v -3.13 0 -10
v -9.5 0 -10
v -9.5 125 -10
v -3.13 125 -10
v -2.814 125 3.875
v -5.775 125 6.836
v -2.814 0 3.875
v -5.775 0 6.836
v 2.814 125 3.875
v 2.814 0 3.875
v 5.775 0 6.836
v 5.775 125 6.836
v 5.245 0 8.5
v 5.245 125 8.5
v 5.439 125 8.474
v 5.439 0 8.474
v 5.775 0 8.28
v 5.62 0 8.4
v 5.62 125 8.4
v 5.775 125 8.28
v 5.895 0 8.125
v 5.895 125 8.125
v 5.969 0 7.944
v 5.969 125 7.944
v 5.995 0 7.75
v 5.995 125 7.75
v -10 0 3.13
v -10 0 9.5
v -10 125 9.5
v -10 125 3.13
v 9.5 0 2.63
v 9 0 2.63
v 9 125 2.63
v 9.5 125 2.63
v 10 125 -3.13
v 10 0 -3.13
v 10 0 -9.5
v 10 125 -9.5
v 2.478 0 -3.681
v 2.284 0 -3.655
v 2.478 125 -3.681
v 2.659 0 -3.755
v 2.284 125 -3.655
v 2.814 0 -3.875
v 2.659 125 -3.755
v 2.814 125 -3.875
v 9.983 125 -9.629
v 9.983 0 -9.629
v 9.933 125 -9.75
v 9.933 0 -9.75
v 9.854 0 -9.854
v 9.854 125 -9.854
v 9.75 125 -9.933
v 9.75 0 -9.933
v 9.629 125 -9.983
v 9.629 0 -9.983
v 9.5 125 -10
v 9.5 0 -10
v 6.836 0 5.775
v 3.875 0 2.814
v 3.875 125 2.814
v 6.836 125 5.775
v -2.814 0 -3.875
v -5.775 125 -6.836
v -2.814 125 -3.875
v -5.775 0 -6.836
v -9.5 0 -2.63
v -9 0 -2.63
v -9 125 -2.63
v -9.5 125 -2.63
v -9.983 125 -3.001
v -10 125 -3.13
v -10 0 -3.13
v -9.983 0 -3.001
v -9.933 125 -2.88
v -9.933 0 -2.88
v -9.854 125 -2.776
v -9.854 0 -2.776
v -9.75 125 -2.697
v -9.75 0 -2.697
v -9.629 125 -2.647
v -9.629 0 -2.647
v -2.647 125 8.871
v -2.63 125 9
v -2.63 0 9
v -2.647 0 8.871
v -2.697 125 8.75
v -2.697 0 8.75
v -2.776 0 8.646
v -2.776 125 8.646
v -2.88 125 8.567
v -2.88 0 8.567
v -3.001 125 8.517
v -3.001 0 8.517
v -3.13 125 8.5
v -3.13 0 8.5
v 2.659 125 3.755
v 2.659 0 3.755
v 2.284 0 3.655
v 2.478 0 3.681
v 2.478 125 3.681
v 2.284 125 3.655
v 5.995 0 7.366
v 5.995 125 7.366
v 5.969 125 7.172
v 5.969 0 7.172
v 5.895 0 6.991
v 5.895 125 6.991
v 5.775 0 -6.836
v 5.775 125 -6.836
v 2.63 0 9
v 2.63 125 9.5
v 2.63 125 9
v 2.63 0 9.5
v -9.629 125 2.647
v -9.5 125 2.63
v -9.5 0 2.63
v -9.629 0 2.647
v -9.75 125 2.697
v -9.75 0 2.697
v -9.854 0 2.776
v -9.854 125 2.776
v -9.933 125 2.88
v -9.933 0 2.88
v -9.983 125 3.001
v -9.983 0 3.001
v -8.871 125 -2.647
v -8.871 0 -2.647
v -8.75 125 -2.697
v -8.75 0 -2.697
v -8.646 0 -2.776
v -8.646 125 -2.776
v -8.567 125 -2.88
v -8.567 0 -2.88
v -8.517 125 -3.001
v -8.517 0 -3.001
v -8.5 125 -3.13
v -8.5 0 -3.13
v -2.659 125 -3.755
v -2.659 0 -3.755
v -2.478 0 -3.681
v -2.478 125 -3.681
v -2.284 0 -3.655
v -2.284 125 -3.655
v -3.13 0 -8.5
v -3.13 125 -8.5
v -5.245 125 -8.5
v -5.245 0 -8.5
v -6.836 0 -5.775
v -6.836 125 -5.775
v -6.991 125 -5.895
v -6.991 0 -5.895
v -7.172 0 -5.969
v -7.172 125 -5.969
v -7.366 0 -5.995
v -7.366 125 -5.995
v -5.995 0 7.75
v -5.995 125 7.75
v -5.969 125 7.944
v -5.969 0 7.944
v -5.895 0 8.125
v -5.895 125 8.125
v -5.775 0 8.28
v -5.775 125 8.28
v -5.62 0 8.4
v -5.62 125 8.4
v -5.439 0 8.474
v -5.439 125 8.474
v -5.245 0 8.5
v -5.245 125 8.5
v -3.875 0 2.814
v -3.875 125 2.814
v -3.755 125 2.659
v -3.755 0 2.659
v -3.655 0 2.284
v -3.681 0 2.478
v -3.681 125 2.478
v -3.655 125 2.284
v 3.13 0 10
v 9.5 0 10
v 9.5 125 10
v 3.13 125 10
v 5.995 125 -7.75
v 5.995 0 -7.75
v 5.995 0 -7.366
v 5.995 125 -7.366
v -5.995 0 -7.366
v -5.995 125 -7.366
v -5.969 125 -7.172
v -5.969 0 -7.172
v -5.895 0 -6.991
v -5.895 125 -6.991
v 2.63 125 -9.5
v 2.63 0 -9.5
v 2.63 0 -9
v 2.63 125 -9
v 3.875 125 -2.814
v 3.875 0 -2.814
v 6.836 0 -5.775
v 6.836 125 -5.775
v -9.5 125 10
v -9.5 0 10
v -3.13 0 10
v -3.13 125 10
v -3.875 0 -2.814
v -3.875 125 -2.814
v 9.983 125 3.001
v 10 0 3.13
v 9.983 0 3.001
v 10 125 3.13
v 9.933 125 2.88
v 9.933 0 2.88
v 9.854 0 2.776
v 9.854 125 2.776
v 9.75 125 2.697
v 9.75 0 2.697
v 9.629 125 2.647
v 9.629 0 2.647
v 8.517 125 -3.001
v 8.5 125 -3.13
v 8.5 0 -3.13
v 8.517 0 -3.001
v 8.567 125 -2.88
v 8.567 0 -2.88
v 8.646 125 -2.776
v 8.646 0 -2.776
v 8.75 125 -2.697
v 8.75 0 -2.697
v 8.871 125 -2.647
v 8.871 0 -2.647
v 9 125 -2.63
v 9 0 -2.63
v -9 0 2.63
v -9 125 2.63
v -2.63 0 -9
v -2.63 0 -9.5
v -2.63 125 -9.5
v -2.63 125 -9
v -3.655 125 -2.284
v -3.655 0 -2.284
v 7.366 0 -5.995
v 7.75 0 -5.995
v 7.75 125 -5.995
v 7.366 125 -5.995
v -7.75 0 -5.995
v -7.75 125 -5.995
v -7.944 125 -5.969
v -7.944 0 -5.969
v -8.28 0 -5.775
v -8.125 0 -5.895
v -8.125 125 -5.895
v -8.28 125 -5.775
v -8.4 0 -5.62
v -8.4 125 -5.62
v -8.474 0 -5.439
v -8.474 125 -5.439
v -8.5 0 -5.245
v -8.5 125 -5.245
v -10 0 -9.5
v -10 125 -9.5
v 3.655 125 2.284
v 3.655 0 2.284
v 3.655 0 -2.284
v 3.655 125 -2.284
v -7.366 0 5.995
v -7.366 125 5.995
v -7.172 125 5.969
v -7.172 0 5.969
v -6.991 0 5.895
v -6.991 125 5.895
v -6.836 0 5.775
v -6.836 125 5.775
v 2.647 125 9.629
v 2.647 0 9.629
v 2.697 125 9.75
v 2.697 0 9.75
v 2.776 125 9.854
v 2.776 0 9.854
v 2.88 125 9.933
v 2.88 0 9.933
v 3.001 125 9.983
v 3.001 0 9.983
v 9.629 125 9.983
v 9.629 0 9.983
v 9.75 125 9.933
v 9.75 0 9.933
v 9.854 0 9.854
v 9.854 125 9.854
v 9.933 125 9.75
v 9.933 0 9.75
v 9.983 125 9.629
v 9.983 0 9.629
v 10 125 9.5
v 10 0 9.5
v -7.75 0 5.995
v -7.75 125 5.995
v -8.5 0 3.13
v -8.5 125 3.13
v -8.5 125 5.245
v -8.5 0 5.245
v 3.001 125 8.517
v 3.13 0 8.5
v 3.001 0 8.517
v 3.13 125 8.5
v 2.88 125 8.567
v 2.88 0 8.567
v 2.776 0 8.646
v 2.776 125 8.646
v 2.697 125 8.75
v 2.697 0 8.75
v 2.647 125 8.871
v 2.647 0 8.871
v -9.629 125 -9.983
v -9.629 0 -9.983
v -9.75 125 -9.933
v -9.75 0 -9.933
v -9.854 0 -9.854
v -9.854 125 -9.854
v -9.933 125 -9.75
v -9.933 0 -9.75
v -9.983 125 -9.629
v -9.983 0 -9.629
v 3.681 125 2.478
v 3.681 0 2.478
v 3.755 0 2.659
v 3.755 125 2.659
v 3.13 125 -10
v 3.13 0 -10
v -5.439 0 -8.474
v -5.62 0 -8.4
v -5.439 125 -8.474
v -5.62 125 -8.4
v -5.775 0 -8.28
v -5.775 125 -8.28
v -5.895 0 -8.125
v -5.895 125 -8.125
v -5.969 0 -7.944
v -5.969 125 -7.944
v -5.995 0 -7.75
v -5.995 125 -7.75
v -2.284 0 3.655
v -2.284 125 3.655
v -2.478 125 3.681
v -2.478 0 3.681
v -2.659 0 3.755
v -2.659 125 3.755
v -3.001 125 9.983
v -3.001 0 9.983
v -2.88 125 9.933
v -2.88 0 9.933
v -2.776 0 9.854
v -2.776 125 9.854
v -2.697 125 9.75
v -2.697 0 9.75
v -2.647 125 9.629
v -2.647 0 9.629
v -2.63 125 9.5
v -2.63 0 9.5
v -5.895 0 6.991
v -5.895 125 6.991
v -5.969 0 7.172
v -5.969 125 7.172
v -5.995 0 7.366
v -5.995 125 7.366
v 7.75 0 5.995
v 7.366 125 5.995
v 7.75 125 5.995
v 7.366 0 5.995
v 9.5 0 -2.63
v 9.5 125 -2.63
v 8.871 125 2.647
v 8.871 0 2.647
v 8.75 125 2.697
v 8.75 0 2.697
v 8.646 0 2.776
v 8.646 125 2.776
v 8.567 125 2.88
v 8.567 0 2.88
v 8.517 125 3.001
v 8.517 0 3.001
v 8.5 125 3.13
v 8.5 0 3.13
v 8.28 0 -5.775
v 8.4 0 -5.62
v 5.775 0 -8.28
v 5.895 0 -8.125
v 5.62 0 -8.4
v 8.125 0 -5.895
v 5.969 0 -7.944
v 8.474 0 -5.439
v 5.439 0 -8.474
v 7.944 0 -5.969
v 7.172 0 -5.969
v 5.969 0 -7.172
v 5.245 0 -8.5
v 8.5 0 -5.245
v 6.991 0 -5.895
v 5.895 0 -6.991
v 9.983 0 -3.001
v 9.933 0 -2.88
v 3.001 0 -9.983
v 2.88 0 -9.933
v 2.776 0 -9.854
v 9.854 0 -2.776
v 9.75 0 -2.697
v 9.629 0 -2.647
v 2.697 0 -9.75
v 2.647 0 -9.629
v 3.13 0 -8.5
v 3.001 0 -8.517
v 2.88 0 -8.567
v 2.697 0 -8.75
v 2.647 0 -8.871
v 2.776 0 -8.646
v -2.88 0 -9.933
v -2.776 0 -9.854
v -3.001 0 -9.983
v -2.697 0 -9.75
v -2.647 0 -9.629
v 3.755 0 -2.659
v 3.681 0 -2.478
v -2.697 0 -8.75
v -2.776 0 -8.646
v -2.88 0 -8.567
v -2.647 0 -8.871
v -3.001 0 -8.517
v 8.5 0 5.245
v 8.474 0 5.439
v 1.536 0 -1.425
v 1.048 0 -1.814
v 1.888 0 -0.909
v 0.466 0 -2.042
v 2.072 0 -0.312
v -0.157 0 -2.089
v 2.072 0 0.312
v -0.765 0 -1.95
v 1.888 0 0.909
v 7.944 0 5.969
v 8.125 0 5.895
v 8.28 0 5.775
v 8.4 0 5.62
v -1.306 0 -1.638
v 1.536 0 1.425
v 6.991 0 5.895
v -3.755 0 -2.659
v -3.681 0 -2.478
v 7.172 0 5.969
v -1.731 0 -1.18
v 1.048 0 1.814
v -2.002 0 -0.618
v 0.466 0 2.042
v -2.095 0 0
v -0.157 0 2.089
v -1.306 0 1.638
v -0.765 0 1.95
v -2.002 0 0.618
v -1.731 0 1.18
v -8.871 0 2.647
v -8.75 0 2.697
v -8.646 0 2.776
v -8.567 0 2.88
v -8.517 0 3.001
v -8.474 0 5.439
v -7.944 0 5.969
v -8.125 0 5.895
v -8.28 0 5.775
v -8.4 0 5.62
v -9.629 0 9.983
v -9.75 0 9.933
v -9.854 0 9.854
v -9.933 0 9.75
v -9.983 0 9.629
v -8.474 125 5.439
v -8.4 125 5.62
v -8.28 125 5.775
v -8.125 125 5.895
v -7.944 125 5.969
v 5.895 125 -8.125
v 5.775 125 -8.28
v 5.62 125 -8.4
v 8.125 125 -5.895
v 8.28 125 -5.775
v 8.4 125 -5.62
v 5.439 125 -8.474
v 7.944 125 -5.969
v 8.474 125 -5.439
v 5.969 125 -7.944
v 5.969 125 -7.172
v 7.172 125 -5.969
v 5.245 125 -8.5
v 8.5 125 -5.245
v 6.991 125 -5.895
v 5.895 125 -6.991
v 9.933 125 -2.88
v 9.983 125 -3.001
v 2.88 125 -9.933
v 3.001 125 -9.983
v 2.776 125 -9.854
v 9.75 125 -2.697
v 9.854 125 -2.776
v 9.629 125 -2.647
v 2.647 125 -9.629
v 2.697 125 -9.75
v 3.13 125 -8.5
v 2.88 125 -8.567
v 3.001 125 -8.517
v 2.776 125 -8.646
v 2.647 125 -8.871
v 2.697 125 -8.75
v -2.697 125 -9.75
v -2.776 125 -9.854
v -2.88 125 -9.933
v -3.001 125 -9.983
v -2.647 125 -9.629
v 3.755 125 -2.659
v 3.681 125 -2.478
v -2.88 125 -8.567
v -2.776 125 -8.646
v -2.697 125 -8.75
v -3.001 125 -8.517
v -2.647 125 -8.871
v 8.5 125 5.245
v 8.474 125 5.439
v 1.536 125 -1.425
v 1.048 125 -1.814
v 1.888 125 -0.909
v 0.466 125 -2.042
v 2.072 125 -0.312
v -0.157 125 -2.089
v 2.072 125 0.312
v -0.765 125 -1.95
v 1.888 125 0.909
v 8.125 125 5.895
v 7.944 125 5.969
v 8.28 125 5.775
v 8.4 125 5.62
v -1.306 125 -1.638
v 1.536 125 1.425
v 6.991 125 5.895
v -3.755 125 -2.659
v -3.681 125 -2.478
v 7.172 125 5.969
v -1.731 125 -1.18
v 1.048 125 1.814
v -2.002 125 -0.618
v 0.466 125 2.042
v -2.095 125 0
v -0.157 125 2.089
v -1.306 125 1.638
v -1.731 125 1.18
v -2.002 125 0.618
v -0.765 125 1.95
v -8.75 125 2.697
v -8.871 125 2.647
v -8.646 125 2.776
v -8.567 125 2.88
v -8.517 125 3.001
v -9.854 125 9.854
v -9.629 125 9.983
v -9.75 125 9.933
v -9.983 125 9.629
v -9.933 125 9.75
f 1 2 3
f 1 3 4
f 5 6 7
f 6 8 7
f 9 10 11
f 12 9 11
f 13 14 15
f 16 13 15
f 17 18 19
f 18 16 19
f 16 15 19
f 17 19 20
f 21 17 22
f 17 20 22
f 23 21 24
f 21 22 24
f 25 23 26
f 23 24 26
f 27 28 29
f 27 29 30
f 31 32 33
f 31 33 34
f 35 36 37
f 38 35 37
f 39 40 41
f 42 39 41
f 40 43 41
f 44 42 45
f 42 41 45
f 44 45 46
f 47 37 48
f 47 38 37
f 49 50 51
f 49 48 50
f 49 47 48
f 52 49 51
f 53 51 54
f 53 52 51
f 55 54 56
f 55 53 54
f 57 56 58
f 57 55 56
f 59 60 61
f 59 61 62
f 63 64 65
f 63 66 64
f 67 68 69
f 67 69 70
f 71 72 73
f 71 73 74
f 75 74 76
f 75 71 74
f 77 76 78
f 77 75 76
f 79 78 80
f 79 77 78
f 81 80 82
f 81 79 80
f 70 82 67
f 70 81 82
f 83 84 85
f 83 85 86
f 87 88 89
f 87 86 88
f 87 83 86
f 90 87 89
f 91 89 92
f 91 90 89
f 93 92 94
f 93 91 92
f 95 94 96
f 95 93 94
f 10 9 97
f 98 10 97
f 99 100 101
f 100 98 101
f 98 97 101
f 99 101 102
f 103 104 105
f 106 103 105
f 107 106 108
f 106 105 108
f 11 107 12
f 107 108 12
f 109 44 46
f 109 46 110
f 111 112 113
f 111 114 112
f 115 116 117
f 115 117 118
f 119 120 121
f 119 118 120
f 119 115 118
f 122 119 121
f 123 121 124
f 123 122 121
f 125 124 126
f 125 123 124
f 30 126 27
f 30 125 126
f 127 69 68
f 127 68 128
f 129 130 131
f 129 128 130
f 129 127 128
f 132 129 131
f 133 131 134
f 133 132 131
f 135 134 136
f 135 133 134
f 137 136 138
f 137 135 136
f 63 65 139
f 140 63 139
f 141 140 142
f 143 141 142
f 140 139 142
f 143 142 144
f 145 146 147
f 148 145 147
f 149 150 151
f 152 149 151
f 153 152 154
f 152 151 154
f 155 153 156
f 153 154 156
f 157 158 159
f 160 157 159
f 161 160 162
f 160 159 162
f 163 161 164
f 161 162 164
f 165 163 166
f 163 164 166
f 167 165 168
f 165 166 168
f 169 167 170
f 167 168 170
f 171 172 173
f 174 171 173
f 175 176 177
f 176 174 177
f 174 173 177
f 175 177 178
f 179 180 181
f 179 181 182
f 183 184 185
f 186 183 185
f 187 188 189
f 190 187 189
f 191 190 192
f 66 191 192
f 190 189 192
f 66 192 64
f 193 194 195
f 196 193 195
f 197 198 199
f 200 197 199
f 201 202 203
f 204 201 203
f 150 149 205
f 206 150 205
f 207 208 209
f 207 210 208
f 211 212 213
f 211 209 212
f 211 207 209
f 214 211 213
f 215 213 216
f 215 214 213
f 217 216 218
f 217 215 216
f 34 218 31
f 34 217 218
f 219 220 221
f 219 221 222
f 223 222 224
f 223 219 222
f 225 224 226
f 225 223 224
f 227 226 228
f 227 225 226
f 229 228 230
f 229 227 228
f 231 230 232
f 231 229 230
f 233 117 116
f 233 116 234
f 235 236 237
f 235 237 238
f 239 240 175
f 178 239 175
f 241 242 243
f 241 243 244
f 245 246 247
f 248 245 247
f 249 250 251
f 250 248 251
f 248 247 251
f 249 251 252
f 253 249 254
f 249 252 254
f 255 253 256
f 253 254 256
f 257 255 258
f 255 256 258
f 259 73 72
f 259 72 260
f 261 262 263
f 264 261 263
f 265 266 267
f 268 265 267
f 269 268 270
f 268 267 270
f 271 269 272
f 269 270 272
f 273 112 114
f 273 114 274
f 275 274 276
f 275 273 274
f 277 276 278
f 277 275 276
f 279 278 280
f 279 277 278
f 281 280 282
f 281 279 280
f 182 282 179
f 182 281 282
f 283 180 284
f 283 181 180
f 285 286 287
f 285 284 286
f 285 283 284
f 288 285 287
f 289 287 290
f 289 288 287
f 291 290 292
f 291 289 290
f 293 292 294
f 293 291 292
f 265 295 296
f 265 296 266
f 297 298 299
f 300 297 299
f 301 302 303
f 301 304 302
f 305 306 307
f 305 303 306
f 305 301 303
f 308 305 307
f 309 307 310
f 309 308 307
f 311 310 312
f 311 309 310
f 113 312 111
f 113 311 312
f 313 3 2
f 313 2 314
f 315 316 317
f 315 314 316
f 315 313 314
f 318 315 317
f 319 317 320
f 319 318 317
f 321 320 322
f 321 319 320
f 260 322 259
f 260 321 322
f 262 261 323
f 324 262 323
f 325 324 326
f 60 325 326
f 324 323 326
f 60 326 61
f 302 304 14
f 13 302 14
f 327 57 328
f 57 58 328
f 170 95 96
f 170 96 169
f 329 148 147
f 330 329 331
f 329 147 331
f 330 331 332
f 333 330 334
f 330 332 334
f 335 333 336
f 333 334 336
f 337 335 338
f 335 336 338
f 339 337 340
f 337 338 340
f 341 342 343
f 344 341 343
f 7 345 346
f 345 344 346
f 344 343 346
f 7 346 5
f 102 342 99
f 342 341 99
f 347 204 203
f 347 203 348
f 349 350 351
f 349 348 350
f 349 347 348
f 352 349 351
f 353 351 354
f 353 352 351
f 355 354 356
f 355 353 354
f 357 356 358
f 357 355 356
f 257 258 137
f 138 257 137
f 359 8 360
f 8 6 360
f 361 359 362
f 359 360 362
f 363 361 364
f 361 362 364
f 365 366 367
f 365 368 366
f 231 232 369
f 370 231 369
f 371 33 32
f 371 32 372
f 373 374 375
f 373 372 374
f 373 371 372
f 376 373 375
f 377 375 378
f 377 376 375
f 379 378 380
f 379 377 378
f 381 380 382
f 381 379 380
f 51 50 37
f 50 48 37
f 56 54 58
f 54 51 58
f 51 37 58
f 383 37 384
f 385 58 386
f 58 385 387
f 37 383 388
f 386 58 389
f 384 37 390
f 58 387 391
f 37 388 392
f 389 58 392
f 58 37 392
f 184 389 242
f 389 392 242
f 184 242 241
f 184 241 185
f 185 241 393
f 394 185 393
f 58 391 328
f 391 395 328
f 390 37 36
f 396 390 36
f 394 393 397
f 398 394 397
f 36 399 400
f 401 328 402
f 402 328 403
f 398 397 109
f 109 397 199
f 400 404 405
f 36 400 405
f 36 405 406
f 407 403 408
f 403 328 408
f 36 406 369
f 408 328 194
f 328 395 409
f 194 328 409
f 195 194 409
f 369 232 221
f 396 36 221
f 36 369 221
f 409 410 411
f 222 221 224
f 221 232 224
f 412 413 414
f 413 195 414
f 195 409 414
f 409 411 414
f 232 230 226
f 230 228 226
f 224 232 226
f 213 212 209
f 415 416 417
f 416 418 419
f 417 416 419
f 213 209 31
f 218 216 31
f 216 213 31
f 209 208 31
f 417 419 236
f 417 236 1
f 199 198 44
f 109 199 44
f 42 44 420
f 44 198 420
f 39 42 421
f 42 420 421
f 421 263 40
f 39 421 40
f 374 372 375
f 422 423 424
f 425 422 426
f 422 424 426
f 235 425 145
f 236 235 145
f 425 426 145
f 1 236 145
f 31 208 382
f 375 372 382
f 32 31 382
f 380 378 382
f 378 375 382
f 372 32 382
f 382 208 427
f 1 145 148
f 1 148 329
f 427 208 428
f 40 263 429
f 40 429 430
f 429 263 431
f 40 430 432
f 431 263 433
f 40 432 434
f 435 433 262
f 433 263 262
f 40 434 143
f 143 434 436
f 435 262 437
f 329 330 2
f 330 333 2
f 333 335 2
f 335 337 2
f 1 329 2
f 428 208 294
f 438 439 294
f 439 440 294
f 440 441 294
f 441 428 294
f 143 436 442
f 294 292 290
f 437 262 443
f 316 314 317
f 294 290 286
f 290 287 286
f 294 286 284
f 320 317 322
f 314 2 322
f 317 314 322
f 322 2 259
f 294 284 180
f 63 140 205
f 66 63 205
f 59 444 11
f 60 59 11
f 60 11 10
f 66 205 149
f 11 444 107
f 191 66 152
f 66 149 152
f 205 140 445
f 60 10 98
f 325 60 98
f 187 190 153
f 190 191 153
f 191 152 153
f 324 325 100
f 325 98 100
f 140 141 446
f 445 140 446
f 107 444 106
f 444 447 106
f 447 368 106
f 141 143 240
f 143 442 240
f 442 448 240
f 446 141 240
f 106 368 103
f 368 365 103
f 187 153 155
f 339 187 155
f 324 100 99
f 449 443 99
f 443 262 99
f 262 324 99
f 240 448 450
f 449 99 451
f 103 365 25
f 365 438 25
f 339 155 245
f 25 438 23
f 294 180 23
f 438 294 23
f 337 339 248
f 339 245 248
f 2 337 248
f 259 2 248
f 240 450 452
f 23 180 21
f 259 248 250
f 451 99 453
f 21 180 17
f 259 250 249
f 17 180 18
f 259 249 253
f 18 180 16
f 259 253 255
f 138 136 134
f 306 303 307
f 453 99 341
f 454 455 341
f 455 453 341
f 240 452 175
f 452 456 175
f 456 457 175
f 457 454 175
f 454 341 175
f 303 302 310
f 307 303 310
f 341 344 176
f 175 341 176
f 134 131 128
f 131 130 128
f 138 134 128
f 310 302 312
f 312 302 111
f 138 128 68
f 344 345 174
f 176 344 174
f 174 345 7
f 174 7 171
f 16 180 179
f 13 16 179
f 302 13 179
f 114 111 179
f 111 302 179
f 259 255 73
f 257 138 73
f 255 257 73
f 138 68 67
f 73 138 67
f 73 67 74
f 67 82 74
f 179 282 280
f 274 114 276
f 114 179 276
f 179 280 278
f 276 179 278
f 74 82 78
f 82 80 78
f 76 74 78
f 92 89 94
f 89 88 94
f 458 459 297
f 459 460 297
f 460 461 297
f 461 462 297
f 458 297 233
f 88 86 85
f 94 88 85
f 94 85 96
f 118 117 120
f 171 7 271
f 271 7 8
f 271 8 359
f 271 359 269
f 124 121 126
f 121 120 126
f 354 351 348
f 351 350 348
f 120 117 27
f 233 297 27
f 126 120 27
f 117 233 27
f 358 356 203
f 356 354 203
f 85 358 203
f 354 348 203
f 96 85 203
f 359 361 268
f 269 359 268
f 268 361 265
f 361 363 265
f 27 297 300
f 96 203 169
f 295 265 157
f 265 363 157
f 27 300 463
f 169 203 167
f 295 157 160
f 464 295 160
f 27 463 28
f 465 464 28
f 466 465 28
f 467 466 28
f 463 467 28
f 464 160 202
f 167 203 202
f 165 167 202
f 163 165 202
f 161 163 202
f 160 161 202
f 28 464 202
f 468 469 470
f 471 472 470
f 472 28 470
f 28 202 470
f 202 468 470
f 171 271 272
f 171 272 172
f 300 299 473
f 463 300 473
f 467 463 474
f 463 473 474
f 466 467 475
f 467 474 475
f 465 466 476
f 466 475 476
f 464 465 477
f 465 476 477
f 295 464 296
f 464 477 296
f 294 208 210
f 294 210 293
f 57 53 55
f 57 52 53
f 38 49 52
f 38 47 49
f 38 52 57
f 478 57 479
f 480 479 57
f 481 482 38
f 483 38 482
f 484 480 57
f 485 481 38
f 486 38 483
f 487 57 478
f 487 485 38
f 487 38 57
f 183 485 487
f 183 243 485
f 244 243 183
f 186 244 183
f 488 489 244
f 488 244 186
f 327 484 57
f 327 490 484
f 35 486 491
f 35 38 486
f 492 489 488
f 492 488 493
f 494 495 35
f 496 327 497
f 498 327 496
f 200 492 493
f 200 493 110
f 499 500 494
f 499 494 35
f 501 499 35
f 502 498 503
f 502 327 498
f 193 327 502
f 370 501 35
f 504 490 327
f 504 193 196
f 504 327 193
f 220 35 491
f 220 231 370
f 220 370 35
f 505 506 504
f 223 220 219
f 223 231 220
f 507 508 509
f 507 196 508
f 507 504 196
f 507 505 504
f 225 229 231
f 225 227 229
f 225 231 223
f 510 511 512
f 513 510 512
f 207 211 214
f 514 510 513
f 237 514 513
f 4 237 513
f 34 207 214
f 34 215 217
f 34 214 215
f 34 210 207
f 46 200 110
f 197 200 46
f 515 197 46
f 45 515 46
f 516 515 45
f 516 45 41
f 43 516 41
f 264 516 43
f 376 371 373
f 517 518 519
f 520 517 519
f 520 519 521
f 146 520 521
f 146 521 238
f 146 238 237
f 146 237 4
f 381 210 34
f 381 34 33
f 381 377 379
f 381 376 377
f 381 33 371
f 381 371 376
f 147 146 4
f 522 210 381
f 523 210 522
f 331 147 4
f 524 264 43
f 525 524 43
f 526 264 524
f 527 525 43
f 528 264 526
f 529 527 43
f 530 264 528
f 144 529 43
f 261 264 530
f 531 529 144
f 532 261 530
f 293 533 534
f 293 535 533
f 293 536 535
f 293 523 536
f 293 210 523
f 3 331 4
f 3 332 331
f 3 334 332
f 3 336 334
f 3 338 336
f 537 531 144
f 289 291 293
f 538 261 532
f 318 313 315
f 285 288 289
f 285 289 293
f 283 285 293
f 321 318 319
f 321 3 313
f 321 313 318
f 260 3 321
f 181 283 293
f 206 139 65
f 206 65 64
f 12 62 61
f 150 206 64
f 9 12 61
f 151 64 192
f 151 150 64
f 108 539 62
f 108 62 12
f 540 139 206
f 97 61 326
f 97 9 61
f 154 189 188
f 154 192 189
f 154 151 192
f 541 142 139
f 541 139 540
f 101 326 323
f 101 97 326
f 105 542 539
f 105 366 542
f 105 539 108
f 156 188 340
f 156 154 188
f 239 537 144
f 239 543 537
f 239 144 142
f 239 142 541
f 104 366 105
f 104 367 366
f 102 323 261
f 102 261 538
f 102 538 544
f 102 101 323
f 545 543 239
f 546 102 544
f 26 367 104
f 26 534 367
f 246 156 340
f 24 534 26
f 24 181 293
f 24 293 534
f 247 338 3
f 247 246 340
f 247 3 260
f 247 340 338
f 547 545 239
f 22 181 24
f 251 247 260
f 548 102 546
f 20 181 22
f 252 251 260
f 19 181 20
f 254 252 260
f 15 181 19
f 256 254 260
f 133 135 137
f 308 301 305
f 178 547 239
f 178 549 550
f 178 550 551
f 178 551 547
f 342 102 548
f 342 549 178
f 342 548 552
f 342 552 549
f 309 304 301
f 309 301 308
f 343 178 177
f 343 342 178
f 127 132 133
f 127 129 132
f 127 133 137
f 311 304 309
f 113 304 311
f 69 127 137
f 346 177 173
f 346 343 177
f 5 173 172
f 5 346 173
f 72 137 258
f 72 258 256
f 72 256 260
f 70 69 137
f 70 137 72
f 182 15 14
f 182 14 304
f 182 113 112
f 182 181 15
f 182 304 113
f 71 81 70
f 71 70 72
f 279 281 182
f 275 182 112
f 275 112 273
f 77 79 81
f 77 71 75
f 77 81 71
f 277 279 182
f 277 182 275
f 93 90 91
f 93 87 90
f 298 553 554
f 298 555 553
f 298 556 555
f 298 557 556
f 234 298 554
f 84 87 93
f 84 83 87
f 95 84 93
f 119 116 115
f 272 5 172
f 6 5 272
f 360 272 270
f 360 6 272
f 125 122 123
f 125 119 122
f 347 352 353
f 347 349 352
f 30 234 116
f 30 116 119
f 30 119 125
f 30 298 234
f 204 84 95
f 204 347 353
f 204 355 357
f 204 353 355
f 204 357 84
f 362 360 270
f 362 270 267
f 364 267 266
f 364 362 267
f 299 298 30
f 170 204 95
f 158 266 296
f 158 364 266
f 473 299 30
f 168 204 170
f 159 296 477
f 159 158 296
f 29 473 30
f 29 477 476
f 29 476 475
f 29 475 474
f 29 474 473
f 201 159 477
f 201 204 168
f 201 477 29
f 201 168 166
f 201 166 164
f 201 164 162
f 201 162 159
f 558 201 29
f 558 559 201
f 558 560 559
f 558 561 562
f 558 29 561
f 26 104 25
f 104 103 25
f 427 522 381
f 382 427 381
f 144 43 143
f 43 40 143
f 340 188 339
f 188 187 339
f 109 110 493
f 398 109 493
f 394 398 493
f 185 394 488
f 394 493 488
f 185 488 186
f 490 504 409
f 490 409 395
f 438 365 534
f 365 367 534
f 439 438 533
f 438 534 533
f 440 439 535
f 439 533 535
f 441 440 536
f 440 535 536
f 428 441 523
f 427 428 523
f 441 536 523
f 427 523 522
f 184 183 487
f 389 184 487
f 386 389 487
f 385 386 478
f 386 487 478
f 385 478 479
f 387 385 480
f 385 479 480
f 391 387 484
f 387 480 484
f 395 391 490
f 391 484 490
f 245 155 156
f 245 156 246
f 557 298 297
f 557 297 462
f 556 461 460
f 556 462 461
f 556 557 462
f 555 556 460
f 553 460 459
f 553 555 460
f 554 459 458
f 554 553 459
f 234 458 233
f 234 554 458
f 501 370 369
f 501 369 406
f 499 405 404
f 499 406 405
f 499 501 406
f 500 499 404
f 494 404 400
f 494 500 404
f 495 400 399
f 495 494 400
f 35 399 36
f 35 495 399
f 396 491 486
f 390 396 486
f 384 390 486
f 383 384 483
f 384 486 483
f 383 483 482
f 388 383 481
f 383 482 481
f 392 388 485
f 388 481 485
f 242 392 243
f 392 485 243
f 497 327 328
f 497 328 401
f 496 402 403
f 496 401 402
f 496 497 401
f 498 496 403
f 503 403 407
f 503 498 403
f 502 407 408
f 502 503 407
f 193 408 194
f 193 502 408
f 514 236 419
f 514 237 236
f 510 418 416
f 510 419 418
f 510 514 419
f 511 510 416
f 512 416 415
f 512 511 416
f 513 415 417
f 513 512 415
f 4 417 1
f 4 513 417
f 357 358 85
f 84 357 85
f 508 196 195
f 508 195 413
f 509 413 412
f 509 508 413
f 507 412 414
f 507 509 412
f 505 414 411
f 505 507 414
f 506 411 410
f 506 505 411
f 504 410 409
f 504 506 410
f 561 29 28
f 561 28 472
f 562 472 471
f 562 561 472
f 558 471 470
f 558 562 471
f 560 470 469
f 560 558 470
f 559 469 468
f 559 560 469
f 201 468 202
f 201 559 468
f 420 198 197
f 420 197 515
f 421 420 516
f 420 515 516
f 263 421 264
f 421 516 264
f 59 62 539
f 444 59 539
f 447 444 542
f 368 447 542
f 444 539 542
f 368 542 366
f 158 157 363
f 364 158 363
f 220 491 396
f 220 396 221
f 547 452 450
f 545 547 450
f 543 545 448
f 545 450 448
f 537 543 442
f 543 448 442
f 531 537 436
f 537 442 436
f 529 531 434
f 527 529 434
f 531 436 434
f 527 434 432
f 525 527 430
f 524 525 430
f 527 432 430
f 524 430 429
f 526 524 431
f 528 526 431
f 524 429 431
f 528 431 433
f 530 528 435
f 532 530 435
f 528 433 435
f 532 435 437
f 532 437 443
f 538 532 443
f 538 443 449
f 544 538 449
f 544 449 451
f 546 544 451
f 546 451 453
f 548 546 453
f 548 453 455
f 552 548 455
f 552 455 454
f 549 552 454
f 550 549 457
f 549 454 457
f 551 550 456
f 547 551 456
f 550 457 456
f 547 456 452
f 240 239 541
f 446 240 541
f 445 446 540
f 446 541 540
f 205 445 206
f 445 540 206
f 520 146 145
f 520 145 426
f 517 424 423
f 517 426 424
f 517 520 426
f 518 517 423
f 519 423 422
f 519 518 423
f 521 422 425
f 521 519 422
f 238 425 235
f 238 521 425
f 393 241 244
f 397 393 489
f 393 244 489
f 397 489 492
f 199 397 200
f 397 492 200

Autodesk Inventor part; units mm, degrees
ref_plane "YZ Plane" through (0, 0, 0) normal (1, 0, 0) x (0, 1, 0)
ref_plane "XZ Plane" through (0, 0, 0) normal (0, 1, 0) x (-1, 0, 0)
ref_plane "XY Plane" through (0, 0, 0) normal (0, 0, 1) x (1, 0, 0)
sketch "Sketch1" plane through (0, 0, 0) normal (0, 1, 0) x (-1, 0, 0)
  line L0 (0, -14) -> (0, 14) projected
  line L1 (-14, 0) -> (14, 0) projected
  line L2 (14, 0) -> (-14, 0) projected
  line L3 (0, -14) -> (0, 14) projected
  line L4 (2.5943, 3.655) -> (-2.5943, 3.655)
  line L5 (-3.655, 2.5943) -> (-3.655, -2.5943)
  line L6 (-2.5943, -3.655) -> (2.5943, -3.655)
  line L7 (3.655, -2.5943) -> (3.655, 2.5943)
  line L8 (-3.655, 3.655) -> (3.655, -3.655) construction
  line L9 (10, 10) -> (10, 2.63)
  line L10 (10, 2.63) -> (8.5, 2.63)
  line L11 (10, 10) -> (2.63, 10)
  line L12 (2.63, 10) -> (2.63, 8.5)
  line L13 (-10, 10) -> (-2.63, 10)
  line L14 (-2.63, 10) -> (-2.63, 8.5)
  line L15 (-10, 8.5) -> (-10, 10)
  line L16 (-10, 10) -> (-8.5, 10)
  line L17 (-8.5, 2.63) -> (-10, 2.63)
  line L18 (-10, 2.63) -> (-10, 10)
  line L19 (-10, -10) -> (-8.5, -10)
  line L20 (-8.5, -2.63) -> (-10, -2.63)
  line L21 (-10, -2.63) -> (-10, -10)
  line L22 (-10, -10) -> (-2.63, -10)
  line L23 (-2.63, -10) -> (-2.63, -8.5)
  line L24 (-10, -8.5) -> (-10, -10)
  line L25 (10, -10) -> (8.5, -10)
  line L26 (8.5, -2.63) -> (10, -2.63)
  line L27 (10, -2.63) -> (10, -10)
  line L28 (10, -10) -> (2.63, -10)
  line L29 (2.63, -10) -> (2.63, -8.5)
  line L30 (10, -8.5) -> (10, -10)
  circle A0 centre (0, 0) radius 2.095
  line L31 (5.995, -10) -> (2.63, -10)
  line L32 (-2.63, -10) -> (-5.995, -10)
  line L33 (10, -10) -> (2.63, -10)
  line L34 (-2.63, -10) -> (-10, -10)
  line L35 (10, -5.995) -> (10, -2.63)
  line L36 (10, 2.63) -> (10, 5.995)
  line L37 (10, 10) -> (10, 2.63)
  line L38 (10, -2.63) -> (10, -10)
  line L39 (-5.995, 10) -> (-2.63, 10)
  line L40 (2.63, 10) -> (5.995, 10)
  line L41 (-10, 10) -> (-2.63, 10)
  line L42 (2.63, 10) -> (10, 10)
  line L43 (-10, 5.995) -> (-10, 2.63)
  line L44 (-10, -2.63) -> (-10, -5.995)
  line L45 (-10, -10) -> (-10, -2.63)
  line L46 (-10, 2.63) -> (-10, 10)
  line L47 (-2.63, -8.5) -> (-5.995, -8.5)
  line L48 (-8.5, -5.995) -> (-8.5, -2.63)
  line L49 (-8.5, -5.995) -> (-7.0557, -5.995)
  line L50 (-5.995, -8.5) -> (-5.995, -7.0557)
  line L51 (-5.995, 7.0557) -> (-5.995, 8.5)
  line L52 (2.63, 8.5) -> (5.995, 8.5)
  line L53 (8.5, 2.63) -> (8.5, 5.995)
  line L54 (8.5, 5.995) -> (7.0557, 5.995)
  line L55 (5.995, 8.5) -> (5.995, 7.0557)
  line L56 (2.63, -8.5) -> (5.995, -8.5)
  line L57 (9.5607, -8.5) -> (10, -8.5)
  line L58 (8.5, -10) -> (8.5, -9.5607)
  line L59 (8.5, -5.995) -> (8.5, -2.63)
  line L60 (7.0557, -5.995) -> (8.5, -5.995)
  line L61 (5.995, -7.0557) -> (5.995, -8.5)
  line L62 (3.655, 3.655) -> (-0.5303, -0.5303) construction
  line L63 (-1.4814, -1.4814) -> (-3.655, -3.655) construction
  line L64 (-8.5, 10) -> (-8.5, 9.5607)
  line L65 (-8.5, 5.995) -> (-8.5, 2.63)
  line L66 (-2.63, 8.5) -> (-5.995, 8.5)
  line L67 (-9.5607, 8.5) -> (-10, 8.5)
  line L68 (-7.0557, 5.995) -> (-8.5, 5.995)
  line L69 (-3.655, 2.5943) -> (-7.0557, 5.995)
  line L70 (-2.5943, 3.655) -> (-5.995, 7.0557)
  line L71 (5.995, 7.0557) -> (2.5943, 3.655)
  line L72 (7.0557, 5.995) -> (3.655, 2.5943)
  line L73 (7.0557, -5.995) -> (3.655, -2.5943)
  line L74 (5.995, -7.0557) -> (2.5943, -3.655)
  line L75 (-2.5943, -3.655) -> (-5.995, -7.0557)
  line L76 (-3.655, -2.5943) -> (-7.0557, -5.995)
  dimension "d26" = 4.19
  dimension "d0" = 20
  dimension "d1" = 20
  dimension "d2" = 7.31
  dimension "d3" = 7.31
  dimension "d4" = 20
  dimension "d5" = 11.99
  dimension "d6" = 11.99
  dimension "d11" = 7.37
  dimension "d12" = 1.5
  dimension "d13" = 7.37
  dimension "d14" = 1.5
  dimension "d15" = 7.37
  dimension "d16" = 1.5
  dimension "d17" = 7.37
  dimension "d18" = 1.5
  dimension "d19" = 7.37
  dimension "d20" = 7.37
  dimension "d21" = 1.5
  dimension "d22" = 1.5
  dimension "d23" = 7.37
  dimension "d24" = 7.37
  dimension "d25" = 1.5
extrude "Extrusion1" add sketch "Sketch1" along normal blind 125 contours L6 L75 L50 L47 L23 L22 L19 L21 L20 L48 L49 L76 L5 L1 A0 L0 | L0 A0 L1 L7 L73 L60 L59 L26 L27 L25 L28 L29 L56 L61 L74 L6 | L1 L5 L69 L68 L65 L17 L18 L15 L13 L14 L66 L51 L70 L4 L0 A0 | A0 L0 L4 L71 L55 L52 L12 L11 L9 L10 L53 L54 L72 L7 L1
fillet "Fillet1" radius 0.5 20 edges at (10, 62.5, 10) (2.63, 62.5, 10) (-2.63, 62.5, 10) (-2.63, 62.5, 8.5) (10, 62.5, 2.63) (8.5, 62.5, 2.63) (10, 62.5, -2.63) (8.5, 62.5, -2.63) (10, 62.5, -10) (2.63, 62.5, -8.5) (-2.63, 62.5, -10) (-2.63, 62.5, -8.5) (2.63, 62.5, -10) (-10, 62.5, -10) (-8.5, 62.5, -2.63) (-10, 62.5, -2.63) (-8.5, 62.5, 2.63) (-10, 62.5, 2.63) (-10, 62.5, 10) (2.63, 62.5, 8.5)
fillet "Fillet2" radius 0.75 24 edges at (-7.0557, 62.5, 5.995) (-3.655, 62.5, 2.5943) (-8.5, 62.5, -5.995) (-7.0557, 62.5, -5.995) (-5.995, 62.5, -8.5) (3.655, 62.5, -2.5943) (7.0557, 62.5, -5.995) (-2.5943, 62.5, 3.655) (-5.995, 62.5, 7.0557) (3.655, 62.5, 2.5943) (7.0557, 62.5, 5.995) (8.5, 62.5, 5.995) (8.5, 62.5, -5.995) (2.5943, 62.5, 3.655) (5.995, 62.5, 7.0557) (5.995, 62.5, 8.5) (-5.995, 62.5, 8.5) (-8.5, 62.5, 5.995) (2.5943, 62.5, -3.655) (5.995, 62.5, -7.0557) (5.995, 62.5, -8.5) (-5.995, 62.5, -7.0557) (-2.5943, 62.5, -3.655) (-3.655, 62.5, -2.5943)
properties part number "pro125mm"
